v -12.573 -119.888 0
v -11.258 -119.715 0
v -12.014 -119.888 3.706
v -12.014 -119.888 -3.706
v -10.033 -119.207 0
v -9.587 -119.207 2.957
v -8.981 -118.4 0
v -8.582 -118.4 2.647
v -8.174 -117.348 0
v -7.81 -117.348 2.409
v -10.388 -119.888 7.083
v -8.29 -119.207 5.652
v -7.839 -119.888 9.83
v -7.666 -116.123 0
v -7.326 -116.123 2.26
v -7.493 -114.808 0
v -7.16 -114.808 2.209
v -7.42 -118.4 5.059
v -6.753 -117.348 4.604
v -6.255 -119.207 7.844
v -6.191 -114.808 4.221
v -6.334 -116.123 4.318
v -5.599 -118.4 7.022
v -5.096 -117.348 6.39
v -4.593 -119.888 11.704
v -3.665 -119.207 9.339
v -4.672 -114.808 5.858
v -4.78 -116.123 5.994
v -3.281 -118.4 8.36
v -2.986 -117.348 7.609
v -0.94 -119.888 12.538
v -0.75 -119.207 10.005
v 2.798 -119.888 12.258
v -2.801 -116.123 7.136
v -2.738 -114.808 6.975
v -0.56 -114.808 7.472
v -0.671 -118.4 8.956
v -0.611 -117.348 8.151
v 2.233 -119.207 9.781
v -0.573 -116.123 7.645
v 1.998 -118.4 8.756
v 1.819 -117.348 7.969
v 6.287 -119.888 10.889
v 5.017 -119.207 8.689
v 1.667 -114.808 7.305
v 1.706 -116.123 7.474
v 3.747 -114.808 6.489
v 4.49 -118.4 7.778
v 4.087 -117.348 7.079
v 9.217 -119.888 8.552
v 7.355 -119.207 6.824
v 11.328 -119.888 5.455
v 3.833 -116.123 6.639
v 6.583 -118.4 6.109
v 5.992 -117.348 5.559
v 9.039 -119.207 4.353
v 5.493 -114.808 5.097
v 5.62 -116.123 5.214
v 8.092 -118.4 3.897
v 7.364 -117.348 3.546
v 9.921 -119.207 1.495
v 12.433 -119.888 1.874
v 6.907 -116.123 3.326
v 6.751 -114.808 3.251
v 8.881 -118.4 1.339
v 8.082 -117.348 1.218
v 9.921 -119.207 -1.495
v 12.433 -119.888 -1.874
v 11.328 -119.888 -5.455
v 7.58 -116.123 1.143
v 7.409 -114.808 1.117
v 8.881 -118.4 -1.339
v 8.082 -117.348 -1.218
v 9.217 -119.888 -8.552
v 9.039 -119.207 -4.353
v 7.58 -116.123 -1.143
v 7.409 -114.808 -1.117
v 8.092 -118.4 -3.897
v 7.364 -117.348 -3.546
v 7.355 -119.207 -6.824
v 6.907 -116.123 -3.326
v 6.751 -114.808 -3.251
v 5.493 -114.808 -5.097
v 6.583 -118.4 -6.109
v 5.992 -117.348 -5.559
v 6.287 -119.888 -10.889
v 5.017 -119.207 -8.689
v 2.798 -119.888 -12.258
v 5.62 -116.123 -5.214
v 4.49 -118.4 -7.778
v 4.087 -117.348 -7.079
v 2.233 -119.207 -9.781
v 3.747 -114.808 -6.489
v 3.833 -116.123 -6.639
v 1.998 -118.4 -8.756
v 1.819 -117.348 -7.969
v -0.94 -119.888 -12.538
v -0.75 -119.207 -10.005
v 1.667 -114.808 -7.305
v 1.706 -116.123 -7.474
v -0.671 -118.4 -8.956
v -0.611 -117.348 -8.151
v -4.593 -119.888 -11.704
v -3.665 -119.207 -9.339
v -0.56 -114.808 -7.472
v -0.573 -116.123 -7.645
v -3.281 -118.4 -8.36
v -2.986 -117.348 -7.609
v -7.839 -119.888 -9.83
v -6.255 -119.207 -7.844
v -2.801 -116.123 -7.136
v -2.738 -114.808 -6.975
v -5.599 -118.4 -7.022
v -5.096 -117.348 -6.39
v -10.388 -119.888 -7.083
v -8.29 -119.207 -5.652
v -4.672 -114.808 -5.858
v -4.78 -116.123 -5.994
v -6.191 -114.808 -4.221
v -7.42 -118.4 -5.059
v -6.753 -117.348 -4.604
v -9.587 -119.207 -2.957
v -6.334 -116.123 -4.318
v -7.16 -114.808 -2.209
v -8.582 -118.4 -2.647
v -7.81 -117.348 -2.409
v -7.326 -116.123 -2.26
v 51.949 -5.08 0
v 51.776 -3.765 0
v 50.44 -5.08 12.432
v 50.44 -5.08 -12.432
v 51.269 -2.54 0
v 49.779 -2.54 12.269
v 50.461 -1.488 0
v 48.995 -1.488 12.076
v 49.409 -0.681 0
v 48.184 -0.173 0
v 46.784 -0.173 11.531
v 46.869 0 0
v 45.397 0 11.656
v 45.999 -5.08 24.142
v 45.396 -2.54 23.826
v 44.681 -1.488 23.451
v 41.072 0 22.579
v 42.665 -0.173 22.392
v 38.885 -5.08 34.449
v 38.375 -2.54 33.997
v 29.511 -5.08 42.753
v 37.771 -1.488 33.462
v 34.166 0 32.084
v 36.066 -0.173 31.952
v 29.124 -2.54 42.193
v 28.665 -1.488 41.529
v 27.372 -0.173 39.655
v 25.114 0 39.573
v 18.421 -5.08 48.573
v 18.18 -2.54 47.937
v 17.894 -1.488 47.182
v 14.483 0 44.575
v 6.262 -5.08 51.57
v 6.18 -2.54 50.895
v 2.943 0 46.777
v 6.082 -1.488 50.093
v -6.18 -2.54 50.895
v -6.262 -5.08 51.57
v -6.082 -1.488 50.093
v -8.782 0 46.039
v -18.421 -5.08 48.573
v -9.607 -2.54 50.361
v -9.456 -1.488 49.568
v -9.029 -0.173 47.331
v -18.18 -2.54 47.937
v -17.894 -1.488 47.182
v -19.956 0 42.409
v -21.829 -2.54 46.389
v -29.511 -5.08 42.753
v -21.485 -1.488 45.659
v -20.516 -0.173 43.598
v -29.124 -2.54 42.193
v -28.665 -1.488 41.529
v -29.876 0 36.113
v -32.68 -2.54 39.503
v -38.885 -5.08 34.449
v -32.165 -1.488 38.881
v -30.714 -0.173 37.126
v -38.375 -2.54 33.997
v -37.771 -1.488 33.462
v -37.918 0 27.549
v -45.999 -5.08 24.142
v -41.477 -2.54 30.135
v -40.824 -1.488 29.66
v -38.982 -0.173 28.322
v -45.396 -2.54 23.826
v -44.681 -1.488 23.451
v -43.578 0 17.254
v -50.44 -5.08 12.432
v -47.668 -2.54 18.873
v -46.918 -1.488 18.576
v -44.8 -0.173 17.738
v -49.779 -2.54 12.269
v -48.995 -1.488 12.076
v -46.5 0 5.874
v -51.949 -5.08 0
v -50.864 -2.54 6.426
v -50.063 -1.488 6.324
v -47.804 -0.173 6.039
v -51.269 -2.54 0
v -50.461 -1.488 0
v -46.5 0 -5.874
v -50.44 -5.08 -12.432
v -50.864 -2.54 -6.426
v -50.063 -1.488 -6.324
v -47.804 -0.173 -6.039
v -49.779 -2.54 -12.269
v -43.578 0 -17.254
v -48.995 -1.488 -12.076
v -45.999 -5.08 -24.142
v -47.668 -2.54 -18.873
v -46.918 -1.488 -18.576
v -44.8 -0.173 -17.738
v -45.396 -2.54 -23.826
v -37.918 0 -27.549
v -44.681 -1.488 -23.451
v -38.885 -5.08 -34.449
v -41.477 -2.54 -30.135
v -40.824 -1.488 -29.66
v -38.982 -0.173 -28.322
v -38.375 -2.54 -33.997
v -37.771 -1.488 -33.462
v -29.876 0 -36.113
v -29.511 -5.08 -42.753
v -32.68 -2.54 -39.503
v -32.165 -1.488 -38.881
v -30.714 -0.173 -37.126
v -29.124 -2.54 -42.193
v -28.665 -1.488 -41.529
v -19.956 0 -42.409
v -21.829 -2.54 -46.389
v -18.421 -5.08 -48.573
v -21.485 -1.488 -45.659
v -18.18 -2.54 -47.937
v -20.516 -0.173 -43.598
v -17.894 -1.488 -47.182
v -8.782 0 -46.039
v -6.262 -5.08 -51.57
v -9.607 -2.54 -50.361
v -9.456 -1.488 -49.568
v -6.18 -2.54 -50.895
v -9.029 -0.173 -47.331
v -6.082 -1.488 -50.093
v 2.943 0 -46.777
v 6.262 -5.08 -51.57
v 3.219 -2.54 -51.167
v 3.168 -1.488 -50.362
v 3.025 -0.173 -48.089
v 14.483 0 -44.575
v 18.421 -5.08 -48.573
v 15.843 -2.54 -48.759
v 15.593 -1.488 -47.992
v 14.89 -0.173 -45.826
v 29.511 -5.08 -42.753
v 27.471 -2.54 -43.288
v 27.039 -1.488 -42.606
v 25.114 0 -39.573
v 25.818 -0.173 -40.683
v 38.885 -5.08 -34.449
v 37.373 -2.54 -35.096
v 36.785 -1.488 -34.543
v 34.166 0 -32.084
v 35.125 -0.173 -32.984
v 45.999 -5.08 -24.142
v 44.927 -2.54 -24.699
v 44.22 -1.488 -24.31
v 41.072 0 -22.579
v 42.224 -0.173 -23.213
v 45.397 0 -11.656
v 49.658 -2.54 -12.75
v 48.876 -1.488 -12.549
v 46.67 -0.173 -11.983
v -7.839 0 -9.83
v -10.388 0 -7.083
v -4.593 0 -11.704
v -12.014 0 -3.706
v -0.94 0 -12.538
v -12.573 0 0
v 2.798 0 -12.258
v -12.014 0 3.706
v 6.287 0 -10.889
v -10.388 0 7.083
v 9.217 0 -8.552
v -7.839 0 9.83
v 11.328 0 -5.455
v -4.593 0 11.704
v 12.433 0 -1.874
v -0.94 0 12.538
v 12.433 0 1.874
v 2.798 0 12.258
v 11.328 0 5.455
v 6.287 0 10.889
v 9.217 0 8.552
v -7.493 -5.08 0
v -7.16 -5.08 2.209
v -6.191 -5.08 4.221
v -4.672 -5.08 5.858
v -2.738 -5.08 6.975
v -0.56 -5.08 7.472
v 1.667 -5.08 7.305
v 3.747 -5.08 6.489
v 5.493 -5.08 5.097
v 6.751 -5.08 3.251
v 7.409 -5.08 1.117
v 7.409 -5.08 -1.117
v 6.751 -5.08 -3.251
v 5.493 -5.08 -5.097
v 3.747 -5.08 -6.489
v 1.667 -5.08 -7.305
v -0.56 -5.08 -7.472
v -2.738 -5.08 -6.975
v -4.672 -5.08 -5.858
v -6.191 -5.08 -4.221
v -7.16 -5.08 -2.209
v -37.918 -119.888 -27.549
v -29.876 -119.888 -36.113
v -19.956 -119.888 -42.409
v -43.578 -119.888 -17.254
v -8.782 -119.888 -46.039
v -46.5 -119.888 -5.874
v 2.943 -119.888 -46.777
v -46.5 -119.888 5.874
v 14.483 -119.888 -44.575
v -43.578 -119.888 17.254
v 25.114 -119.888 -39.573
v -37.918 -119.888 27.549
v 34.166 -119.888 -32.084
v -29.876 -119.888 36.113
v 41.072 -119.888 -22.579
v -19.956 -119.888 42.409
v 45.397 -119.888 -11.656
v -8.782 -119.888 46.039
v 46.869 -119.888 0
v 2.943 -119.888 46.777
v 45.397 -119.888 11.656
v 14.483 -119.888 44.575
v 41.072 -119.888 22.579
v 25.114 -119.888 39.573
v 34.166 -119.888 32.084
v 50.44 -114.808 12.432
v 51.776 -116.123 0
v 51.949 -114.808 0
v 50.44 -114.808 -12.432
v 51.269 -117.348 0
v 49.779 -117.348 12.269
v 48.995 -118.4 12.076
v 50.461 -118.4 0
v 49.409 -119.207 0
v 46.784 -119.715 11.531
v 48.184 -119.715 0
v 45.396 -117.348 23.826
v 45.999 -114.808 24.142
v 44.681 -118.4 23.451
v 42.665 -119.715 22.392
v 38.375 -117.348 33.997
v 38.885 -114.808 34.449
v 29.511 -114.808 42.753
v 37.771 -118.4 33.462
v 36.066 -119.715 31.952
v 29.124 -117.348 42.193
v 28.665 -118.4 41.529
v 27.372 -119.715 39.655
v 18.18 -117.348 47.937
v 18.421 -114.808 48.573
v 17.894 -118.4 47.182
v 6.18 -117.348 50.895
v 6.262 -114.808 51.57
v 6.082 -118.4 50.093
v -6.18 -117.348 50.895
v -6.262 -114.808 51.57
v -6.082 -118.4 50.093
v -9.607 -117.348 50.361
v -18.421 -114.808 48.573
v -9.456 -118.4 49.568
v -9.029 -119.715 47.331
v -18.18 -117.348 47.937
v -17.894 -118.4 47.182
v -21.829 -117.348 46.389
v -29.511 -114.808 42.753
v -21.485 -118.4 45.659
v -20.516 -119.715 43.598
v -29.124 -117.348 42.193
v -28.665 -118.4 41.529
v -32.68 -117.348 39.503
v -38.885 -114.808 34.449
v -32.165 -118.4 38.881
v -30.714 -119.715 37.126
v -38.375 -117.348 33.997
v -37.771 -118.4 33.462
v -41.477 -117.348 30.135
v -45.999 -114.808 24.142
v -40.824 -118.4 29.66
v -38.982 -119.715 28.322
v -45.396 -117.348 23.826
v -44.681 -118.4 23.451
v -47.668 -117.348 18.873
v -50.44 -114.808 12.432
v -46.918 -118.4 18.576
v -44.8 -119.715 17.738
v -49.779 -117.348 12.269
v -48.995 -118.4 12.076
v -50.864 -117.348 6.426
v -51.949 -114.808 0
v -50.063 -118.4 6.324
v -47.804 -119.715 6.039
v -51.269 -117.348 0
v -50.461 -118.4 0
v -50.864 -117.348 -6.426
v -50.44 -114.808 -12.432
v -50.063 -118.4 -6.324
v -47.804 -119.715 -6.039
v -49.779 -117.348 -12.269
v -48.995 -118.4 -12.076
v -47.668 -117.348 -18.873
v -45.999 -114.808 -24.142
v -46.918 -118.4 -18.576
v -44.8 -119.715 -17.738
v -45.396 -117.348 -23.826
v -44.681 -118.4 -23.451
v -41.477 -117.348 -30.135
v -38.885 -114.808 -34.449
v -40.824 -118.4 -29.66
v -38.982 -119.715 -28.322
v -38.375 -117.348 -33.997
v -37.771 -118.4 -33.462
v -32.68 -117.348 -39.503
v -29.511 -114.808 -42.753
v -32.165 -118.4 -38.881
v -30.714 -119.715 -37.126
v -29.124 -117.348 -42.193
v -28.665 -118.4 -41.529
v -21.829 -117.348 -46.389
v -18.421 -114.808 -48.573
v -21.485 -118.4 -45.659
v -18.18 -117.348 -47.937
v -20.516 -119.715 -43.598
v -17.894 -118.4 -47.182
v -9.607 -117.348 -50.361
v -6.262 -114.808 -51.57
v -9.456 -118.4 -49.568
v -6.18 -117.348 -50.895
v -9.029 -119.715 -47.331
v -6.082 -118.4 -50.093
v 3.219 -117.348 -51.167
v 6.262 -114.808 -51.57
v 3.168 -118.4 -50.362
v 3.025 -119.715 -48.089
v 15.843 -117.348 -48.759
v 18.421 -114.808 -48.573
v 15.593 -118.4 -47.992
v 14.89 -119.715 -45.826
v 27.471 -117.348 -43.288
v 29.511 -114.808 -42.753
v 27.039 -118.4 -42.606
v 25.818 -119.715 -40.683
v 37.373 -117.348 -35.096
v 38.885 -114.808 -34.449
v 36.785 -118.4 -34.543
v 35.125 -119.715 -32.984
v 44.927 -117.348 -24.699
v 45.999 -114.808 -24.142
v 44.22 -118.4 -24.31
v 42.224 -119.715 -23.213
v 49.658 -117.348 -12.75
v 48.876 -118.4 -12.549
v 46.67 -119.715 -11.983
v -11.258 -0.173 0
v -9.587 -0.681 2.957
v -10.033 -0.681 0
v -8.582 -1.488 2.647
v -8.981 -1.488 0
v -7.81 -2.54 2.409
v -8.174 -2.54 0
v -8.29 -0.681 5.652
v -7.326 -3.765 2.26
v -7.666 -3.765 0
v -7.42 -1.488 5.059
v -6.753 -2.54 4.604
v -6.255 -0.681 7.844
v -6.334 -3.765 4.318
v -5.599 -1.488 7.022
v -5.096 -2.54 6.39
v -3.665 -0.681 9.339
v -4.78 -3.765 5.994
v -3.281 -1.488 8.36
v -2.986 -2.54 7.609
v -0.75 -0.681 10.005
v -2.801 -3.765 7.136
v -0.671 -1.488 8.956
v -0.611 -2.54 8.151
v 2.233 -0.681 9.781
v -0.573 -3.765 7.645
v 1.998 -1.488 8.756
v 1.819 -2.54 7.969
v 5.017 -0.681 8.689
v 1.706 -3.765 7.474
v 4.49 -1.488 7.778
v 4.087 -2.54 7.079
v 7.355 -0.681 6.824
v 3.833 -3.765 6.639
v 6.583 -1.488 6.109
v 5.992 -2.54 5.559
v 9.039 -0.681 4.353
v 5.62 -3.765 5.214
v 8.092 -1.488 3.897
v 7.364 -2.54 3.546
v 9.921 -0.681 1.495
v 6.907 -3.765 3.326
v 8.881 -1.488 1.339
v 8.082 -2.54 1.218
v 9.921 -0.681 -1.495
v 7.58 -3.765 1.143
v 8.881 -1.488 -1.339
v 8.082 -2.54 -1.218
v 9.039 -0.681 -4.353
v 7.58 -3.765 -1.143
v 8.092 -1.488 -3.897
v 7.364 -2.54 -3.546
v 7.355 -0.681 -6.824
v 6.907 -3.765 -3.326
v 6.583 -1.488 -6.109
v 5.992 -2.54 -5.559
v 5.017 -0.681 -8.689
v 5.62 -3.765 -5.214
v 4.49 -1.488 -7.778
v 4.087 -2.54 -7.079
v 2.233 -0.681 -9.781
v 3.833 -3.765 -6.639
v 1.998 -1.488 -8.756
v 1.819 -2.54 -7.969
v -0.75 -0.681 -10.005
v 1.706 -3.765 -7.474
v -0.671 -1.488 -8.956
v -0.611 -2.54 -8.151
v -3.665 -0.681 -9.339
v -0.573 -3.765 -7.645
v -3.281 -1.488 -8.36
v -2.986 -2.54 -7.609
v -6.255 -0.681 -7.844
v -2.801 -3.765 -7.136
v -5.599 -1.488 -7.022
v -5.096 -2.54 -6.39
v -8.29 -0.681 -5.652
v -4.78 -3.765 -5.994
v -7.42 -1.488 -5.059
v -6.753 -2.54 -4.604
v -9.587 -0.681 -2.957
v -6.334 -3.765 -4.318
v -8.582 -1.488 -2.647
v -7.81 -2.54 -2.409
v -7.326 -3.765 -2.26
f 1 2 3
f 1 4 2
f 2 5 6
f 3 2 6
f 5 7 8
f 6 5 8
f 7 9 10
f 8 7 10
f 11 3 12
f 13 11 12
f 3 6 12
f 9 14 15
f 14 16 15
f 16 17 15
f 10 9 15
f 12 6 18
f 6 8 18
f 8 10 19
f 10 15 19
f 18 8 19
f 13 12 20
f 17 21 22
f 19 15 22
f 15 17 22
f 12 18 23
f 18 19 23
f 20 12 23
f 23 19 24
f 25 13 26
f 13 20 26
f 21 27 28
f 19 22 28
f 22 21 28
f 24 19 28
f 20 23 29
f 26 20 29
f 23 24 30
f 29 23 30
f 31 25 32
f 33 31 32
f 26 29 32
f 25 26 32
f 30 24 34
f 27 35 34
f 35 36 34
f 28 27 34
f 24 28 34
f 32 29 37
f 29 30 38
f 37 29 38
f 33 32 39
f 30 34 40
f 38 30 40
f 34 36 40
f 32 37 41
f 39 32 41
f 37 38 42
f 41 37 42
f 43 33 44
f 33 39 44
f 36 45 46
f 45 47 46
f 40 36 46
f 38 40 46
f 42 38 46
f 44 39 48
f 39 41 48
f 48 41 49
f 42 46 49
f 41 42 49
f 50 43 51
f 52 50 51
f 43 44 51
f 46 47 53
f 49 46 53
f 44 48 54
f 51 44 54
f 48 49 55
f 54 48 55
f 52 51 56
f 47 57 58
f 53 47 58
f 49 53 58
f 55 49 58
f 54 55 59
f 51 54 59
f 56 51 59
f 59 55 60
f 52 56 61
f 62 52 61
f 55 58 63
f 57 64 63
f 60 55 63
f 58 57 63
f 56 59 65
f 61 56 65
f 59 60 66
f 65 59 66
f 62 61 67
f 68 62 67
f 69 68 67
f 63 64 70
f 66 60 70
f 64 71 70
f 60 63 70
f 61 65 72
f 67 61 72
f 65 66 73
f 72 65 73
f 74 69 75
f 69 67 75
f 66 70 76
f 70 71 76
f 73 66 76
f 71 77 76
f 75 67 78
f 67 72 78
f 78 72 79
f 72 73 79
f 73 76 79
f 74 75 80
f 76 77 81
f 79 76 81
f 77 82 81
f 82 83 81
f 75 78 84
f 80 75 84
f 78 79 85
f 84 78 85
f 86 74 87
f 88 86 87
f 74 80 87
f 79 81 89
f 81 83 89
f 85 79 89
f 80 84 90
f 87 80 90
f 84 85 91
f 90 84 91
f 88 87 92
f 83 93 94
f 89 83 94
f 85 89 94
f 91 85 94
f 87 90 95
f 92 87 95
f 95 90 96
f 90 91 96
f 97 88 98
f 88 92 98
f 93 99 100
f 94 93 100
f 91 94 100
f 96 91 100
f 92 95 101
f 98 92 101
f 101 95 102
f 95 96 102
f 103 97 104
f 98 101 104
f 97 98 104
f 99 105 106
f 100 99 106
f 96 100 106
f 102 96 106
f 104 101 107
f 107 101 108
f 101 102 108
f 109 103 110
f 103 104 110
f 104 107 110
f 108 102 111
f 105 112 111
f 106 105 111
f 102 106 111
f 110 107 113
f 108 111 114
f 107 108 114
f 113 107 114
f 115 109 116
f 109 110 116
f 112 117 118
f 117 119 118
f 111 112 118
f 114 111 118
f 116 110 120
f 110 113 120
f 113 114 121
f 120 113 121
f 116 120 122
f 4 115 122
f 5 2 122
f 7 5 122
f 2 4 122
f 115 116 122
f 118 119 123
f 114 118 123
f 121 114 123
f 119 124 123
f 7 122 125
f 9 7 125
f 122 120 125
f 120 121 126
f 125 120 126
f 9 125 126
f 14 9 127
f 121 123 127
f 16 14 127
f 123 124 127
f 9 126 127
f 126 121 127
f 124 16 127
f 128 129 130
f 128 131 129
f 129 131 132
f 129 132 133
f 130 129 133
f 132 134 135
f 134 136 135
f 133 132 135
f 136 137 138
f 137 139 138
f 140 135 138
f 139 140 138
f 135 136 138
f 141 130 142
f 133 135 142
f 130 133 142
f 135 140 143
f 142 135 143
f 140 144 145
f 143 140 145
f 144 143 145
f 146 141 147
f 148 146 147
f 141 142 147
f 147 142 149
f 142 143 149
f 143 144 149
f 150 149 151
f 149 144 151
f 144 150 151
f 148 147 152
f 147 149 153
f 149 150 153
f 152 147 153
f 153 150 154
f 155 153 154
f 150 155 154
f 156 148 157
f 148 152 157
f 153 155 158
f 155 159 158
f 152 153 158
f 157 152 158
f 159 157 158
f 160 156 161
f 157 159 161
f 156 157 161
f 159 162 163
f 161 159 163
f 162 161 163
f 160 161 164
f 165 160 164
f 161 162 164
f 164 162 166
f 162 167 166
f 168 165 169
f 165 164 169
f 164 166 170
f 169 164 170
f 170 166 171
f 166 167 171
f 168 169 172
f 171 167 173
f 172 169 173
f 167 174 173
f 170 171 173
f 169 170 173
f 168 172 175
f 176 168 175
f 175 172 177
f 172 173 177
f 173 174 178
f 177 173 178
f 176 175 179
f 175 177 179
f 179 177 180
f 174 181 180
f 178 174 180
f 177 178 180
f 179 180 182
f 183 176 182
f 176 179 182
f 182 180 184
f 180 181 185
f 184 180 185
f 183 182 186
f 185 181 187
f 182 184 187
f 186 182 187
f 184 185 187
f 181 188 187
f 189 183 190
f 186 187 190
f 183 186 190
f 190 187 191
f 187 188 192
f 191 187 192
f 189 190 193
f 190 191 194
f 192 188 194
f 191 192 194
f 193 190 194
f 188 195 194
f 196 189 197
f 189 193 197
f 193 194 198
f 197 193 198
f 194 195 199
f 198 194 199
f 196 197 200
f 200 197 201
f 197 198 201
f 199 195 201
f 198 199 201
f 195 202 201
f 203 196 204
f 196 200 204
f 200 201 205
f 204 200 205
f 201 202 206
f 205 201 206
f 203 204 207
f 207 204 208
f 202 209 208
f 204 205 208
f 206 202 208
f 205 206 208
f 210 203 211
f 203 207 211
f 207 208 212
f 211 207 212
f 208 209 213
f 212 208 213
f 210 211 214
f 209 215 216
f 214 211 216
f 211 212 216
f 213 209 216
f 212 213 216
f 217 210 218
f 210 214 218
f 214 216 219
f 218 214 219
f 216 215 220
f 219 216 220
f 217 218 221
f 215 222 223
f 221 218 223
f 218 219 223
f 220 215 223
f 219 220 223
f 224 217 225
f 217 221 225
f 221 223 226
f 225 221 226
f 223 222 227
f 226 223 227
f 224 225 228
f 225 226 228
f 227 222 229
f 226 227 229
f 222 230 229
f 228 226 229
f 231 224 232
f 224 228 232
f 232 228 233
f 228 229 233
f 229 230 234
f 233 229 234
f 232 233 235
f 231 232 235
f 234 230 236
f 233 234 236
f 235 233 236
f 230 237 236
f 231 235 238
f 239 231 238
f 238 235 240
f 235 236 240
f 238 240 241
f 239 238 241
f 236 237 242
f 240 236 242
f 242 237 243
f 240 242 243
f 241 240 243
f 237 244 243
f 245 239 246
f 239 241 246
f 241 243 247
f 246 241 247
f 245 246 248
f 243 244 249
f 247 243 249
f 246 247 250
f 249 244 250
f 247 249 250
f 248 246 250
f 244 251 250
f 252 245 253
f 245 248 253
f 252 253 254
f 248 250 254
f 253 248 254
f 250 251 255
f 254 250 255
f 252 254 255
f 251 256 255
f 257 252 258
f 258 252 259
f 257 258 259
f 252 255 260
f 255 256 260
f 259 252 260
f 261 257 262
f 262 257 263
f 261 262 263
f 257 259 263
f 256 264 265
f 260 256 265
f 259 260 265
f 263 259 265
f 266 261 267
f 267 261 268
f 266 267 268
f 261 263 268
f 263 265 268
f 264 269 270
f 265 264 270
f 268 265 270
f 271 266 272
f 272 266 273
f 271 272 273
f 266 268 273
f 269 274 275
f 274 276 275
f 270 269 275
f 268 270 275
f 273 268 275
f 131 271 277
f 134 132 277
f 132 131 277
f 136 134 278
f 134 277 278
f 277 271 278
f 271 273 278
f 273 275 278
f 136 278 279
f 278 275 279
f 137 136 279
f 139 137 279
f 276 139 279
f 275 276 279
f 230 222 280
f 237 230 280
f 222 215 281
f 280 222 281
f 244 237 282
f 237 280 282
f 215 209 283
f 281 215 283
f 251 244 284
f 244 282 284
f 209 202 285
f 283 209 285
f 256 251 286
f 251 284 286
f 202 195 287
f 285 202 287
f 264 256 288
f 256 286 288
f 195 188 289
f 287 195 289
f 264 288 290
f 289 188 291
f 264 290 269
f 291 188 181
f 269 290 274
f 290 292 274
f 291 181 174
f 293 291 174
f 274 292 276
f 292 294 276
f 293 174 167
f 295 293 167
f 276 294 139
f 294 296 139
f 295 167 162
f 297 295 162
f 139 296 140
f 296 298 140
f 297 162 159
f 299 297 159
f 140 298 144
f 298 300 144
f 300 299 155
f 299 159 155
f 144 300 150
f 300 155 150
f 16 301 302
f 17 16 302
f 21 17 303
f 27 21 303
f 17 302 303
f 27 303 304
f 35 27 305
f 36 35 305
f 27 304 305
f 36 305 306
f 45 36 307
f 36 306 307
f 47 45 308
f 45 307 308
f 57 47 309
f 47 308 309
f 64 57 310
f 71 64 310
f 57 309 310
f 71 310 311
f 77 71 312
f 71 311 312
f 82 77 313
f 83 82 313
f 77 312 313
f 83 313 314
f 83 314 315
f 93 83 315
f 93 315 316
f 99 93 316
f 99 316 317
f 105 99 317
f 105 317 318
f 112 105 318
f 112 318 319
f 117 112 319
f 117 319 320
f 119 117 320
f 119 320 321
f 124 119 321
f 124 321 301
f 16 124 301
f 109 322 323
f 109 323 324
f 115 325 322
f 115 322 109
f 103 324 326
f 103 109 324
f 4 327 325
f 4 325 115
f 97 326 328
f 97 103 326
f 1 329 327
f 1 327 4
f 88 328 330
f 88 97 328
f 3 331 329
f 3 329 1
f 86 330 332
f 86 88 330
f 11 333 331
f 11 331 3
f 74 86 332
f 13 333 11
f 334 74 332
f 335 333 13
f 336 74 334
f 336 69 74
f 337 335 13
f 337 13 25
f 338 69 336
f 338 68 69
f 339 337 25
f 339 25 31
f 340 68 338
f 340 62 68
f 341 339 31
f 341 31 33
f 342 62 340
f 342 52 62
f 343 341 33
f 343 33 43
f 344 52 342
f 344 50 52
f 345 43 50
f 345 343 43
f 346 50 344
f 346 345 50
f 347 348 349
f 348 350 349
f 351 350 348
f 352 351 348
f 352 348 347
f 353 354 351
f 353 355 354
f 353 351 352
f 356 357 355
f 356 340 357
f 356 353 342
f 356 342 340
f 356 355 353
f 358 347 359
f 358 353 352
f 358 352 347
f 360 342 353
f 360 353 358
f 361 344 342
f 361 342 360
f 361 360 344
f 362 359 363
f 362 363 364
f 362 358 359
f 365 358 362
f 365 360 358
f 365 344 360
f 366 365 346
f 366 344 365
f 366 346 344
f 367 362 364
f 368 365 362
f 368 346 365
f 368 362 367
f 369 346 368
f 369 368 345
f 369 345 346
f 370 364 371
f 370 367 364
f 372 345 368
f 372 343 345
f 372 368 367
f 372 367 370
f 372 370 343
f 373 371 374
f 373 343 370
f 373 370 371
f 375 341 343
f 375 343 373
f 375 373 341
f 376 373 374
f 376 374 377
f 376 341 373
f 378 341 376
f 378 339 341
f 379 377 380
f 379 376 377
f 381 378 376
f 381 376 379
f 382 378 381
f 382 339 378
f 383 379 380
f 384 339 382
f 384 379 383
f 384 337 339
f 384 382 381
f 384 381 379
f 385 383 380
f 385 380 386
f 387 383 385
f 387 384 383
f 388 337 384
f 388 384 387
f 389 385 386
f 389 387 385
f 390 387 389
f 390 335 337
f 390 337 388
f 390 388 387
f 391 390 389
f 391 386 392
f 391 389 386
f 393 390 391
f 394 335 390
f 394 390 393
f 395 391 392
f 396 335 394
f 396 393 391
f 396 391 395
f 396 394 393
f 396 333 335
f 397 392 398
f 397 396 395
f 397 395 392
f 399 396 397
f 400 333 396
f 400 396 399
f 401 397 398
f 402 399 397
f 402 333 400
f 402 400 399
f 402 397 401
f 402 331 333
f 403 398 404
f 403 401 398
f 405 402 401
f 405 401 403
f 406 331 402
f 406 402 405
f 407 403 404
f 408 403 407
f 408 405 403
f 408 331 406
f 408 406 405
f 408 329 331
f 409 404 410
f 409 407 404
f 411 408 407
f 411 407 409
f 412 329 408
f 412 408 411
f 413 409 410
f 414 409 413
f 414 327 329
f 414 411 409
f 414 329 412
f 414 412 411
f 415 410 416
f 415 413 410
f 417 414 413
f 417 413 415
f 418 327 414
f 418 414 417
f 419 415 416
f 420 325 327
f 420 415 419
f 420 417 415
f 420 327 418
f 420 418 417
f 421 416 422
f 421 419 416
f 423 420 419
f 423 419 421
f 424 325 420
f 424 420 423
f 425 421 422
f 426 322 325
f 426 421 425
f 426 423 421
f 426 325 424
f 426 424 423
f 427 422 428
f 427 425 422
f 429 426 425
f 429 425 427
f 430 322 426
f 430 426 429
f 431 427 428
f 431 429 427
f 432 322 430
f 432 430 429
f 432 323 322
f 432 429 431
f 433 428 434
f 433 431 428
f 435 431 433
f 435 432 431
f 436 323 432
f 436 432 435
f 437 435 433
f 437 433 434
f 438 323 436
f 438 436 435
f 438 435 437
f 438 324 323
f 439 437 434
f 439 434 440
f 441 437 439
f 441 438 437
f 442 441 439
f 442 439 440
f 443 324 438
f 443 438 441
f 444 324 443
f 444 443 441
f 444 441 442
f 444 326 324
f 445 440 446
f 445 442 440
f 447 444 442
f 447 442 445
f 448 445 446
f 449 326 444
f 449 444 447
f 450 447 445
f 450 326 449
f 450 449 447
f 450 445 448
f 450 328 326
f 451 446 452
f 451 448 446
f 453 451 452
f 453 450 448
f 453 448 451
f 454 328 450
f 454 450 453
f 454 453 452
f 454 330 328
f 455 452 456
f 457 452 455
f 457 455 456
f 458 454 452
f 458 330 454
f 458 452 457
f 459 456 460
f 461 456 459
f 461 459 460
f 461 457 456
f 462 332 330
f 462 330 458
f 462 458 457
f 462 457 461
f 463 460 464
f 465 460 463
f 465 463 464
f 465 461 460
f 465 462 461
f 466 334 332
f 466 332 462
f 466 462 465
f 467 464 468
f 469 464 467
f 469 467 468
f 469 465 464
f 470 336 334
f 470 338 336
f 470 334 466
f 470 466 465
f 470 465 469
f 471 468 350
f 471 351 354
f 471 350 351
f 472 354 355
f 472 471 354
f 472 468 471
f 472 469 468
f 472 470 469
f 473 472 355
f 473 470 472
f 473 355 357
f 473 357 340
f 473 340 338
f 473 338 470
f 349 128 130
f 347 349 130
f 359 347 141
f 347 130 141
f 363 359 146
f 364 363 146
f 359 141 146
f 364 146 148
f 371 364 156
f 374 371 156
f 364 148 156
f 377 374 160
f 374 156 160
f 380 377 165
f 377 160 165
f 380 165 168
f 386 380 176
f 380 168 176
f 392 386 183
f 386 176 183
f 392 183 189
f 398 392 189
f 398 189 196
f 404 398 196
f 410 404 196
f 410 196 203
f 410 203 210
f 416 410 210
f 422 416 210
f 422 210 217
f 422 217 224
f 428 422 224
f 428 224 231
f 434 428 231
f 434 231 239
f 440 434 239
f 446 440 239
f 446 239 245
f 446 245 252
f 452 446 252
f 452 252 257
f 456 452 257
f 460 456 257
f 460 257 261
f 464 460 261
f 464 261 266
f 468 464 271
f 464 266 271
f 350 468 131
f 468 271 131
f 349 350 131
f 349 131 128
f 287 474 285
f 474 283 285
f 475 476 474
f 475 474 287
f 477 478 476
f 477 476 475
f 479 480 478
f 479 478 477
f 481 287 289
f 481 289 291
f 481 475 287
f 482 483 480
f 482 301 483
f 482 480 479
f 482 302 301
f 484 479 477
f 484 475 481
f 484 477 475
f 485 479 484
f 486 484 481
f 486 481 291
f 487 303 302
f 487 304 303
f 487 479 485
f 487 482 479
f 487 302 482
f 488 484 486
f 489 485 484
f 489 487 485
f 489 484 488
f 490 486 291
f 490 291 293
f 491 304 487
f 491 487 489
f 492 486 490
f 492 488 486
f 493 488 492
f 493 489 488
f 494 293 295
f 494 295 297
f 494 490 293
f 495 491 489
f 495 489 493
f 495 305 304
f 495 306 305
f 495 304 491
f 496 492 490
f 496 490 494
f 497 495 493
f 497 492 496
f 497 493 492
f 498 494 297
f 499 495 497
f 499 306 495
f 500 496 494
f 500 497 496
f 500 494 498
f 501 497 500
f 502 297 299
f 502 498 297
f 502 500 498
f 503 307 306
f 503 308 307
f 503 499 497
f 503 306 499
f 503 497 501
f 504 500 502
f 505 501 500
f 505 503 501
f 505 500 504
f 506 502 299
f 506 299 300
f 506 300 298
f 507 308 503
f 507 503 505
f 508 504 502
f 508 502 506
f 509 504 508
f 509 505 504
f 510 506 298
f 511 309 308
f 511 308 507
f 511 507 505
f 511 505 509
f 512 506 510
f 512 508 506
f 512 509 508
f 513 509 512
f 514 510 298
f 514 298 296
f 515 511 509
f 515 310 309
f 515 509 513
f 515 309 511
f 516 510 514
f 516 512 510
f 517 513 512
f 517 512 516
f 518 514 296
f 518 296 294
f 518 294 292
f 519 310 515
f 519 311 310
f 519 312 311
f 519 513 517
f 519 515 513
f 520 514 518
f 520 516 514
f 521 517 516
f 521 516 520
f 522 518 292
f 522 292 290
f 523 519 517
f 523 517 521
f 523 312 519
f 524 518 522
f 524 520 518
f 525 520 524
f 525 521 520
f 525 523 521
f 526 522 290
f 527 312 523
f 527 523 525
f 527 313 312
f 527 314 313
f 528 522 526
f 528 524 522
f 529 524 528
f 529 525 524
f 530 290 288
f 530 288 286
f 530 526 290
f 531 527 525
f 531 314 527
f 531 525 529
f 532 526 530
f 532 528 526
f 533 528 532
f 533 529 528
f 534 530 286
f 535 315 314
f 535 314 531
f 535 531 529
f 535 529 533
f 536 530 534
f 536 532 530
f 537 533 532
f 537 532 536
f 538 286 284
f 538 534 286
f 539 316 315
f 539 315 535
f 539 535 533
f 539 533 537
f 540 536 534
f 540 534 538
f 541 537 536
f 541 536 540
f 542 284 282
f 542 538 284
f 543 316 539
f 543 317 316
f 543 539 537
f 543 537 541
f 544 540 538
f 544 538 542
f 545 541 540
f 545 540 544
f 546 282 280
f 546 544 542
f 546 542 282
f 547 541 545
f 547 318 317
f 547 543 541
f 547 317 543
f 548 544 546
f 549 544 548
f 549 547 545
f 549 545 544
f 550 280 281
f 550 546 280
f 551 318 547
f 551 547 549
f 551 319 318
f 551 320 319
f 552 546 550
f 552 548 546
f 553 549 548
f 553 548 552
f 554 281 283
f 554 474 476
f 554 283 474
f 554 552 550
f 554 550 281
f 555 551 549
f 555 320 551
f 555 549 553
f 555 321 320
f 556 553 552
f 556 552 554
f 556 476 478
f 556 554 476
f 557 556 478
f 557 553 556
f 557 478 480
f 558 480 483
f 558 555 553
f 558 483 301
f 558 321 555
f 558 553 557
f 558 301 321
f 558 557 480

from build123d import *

# Parameters (mm, degrees)
F0_R     = 51.9492240189
F1_DEPTH = 25.4
F2_DEPTH = 94.488
F5_D     = 14.986
F6_R     = 5.08


with BuildPart() as f1:
    # F0 (on Front) → F1 (new body)
    with BuildSketch(Plane.XZ):
        Circle(F0_R)
    extrude(amount=F1_DEPTH)

    # F2 (add): a face of the model
    f2_faces = [f1.faces().sort_by_distance(p)[0] for p in [
        (0, -25.4, 0),
    ]]
    extrude(f2_faces, amount=F2_DEPTH)

    # F5 (through all)
    with Locations(Plane.XZ.offset(119.888)):
        with Locations((0, 0)):
            Hole(F5_D / 2)

    # F6
    f6_edges = [f1.edges().sort_by_distance(p)[0] for p in [
        (-51.949224, -119.888, 0),
        (-51.949224, 0, 0),
        (-7.493, 0, 0),
        (-7.493, -119.888, 0),
    ]]
    fillet(f6_edges, radius=F6_R)


solid = f1.part
